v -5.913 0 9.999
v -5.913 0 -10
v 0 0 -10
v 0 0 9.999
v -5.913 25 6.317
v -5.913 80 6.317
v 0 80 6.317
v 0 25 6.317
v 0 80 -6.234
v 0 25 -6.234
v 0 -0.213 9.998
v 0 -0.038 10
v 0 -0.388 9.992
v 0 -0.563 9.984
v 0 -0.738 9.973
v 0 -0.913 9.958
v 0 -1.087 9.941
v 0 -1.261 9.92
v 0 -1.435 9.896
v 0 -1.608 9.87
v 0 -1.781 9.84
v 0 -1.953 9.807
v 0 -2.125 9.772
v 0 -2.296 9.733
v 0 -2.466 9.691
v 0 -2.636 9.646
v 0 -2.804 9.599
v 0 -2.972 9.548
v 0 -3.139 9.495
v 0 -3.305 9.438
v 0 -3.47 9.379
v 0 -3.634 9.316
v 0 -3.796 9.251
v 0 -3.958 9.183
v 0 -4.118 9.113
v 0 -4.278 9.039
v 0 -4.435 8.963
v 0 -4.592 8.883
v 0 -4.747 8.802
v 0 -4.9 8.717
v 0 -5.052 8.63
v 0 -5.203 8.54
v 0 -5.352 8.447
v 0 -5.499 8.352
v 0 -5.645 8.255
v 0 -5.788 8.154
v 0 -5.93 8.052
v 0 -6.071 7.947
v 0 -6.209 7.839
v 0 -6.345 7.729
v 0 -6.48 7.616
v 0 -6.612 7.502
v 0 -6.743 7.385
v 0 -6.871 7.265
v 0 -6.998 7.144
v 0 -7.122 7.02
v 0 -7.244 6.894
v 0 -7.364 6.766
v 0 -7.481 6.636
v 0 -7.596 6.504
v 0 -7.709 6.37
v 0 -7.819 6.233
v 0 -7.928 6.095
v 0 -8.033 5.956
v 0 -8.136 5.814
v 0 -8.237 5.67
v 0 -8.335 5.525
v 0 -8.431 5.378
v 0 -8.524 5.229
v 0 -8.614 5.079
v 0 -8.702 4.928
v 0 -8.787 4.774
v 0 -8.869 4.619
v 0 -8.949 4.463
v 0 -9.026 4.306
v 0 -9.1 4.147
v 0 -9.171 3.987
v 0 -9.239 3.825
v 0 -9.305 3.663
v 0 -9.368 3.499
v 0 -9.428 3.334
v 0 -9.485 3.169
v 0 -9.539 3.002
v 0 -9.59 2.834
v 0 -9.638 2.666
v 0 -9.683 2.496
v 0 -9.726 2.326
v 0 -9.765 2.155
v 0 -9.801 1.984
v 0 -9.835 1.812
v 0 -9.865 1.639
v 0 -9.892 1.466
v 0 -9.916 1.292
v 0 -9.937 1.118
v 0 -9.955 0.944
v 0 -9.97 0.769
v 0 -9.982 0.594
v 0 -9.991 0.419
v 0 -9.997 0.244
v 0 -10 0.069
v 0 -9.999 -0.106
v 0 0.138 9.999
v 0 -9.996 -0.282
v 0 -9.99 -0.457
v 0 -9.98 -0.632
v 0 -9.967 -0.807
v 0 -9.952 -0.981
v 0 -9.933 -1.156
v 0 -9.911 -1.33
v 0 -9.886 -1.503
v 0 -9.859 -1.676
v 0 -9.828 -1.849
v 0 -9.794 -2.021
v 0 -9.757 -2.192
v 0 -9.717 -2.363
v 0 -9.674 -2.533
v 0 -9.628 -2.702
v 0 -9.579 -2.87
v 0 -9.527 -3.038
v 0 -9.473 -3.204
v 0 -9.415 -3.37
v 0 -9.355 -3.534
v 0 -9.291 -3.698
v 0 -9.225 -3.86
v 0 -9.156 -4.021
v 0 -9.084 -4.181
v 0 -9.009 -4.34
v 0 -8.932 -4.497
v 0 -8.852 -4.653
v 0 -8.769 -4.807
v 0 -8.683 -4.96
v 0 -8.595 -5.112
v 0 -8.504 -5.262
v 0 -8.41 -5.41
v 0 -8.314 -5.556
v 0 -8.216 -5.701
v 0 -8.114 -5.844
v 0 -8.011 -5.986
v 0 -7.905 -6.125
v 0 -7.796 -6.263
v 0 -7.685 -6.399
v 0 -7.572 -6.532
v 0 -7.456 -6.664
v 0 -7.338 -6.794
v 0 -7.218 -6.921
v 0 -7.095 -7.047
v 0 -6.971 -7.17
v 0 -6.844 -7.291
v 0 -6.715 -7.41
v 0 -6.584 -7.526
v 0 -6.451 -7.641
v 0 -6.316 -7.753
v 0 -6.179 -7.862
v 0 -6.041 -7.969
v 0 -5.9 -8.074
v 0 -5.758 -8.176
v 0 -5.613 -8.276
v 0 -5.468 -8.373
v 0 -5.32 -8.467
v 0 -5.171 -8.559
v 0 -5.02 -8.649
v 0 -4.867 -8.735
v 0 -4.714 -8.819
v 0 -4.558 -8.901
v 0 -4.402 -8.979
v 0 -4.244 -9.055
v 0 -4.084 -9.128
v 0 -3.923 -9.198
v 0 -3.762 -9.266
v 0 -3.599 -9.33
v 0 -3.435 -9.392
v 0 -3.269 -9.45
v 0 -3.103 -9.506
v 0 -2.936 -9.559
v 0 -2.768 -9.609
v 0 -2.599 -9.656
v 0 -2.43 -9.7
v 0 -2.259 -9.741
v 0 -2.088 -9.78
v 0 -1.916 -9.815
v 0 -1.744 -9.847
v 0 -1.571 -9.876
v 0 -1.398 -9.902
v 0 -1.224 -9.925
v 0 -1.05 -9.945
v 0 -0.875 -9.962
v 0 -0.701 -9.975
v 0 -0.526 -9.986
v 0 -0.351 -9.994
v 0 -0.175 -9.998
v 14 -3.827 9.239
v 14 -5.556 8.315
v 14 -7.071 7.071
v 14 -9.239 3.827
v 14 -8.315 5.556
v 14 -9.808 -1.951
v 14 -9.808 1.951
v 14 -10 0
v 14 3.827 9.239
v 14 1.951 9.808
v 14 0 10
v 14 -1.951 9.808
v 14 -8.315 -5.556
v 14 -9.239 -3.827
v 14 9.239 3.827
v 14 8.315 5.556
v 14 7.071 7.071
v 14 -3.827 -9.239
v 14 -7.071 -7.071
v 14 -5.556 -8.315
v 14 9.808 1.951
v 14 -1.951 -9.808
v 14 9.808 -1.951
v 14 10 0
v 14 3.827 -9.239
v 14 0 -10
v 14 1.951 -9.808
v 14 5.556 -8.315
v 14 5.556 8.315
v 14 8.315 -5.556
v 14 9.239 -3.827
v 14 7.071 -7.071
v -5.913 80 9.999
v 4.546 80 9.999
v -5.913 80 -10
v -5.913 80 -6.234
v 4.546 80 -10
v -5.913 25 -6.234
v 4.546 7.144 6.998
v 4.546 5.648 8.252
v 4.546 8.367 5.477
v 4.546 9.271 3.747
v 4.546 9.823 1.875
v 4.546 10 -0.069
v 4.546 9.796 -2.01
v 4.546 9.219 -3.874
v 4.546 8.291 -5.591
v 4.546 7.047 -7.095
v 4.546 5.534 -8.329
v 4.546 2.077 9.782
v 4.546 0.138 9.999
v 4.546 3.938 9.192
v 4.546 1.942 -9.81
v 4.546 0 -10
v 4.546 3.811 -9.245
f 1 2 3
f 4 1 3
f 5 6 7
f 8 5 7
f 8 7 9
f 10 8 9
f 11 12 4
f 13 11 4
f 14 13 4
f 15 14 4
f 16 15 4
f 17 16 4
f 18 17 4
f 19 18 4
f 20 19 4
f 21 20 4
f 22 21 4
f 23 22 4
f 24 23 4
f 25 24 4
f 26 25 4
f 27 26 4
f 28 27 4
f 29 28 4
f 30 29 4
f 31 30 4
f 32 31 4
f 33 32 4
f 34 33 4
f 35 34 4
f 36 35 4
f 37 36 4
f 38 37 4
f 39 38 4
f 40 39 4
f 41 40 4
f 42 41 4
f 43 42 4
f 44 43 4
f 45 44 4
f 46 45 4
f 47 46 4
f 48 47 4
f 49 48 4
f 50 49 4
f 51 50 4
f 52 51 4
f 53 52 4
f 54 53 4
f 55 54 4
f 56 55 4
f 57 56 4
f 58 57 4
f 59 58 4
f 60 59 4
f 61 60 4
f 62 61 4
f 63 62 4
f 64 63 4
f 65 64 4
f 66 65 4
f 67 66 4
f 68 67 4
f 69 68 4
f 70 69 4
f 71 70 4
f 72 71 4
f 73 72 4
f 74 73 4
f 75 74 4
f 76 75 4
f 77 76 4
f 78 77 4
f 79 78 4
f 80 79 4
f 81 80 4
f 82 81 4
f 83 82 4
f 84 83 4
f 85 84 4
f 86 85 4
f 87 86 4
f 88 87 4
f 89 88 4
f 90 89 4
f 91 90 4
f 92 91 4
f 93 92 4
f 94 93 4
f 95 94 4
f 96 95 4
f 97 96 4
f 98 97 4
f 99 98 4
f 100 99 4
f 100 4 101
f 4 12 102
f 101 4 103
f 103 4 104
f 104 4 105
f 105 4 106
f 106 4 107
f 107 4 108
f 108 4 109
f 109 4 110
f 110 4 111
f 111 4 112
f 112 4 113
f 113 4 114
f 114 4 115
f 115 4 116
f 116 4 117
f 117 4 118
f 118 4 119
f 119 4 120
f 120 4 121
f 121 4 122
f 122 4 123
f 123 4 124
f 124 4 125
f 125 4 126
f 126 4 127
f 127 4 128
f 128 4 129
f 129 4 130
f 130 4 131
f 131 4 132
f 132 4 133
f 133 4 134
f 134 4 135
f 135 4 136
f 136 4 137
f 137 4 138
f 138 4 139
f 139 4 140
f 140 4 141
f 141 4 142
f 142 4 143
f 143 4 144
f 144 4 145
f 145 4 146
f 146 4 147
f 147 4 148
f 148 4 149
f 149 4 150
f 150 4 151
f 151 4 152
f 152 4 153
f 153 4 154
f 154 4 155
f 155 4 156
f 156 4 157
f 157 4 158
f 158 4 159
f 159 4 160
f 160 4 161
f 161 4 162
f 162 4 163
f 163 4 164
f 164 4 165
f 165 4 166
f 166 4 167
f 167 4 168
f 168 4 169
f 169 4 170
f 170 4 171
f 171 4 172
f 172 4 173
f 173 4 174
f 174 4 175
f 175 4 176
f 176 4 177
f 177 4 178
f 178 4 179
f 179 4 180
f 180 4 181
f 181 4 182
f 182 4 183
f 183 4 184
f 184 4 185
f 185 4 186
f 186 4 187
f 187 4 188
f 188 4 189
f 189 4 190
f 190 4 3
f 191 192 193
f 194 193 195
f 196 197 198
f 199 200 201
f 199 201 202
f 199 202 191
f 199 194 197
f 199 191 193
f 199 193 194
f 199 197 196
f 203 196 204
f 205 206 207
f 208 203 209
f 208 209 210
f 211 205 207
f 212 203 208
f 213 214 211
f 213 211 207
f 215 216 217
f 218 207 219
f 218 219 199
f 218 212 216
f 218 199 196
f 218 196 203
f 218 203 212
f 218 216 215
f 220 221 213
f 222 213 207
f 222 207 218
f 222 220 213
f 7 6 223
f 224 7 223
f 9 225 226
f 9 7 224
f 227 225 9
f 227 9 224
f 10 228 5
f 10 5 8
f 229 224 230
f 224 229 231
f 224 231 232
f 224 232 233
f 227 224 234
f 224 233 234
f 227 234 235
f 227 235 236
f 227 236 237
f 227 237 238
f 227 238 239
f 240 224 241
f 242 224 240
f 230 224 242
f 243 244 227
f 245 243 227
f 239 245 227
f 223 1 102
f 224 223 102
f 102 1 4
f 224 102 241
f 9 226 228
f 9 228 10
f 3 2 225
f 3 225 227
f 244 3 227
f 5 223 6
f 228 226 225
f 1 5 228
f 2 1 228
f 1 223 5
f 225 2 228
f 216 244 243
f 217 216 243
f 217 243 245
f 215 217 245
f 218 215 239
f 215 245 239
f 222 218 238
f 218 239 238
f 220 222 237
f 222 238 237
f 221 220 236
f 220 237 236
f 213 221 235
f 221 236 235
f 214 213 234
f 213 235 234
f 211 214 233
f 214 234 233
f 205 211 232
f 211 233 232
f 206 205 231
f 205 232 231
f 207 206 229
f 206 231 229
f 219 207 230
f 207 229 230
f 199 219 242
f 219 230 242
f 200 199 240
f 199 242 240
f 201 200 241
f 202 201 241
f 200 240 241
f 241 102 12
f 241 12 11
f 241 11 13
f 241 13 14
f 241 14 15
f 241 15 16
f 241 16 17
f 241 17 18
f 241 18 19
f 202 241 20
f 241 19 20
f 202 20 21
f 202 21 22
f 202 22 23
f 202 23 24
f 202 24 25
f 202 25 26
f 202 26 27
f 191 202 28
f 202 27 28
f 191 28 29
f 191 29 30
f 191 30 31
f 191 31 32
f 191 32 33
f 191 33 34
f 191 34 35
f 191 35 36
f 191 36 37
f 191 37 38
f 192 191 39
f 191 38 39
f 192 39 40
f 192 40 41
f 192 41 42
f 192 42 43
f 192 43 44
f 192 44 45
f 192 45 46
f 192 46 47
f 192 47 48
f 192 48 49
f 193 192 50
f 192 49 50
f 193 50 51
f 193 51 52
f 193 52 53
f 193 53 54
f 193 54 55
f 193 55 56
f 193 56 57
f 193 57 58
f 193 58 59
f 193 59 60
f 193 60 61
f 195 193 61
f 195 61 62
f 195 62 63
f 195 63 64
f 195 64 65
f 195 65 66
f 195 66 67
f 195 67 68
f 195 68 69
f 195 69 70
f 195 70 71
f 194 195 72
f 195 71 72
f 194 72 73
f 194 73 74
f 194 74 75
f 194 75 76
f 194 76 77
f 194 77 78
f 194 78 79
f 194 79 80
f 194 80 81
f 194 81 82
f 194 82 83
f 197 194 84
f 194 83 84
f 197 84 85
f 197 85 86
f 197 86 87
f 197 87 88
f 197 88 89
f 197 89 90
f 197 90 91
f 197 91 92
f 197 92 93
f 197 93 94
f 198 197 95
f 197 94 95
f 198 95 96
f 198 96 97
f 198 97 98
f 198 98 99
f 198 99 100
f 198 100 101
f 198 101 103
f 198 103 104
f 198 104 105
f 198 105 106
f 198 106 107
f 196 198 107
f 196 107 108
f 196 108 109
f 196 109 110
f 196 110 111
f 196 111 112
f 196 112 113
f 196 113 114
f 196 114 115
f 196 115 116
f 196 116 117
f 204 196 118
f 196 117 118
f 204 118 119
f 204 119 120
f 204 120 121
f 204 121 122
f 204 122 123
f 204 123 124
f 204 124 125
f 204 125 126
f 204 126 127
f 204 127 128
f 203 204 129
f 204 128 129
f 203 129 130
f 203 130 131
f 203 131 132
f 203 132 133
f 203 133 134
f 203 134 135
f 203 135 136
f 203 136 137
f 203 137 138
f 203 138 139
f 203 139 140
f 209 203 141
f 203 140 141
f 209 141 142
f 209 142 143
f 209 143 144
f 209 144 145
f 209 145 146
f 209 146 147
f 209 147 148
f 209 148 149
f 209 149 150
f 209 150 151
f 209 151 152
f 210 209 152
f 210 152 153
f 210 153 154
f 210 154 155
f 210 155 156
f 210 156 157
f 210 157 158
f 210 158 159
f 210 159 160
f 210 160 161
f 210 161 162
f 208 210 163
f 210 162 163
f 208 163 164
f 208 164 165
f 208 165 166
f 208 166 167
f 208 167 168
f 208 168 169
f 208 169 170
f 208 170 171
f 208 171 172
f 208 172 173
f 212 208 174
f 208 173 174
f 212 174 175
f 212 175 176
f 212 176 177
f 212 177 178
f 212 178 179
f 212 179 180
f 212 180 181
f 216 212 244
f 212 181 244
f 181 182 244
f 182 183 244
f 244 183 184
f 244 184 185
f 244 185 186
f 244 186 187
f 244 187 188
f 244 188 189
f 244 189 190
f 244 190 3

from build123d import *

# Parameters (mm, degrees)
SKETCH1_R           = 10
BOSS_EXTRUDE7_DEPTH = 14
SKETCH7_W           = 10.45925955
SKETCH7_H           = 19.99905213
BOSS_EXTRUDE9_DEPTH = 80
SKETCH8_W           = 5.913333595
SKETCH8_H           = 12.55111146
CUT_EXTRUDE3_DEPTH  = 55


with BuildPart() as part:
    # Sketch1 → Boss-Extrude7 (new body)
    with BuildSketch(Plane(origin=(0, 0, 0), x_dir=(0, 0, -1), z_dir=(1, 0, 0))):
        Circle(SKETCH1_R)
    extrude(amount=BOSS_EXTRUDE7_DEPTH)

    # Sketch7 → Boss-Extrude9 (add)
    with BuildSketch(Plane(origin=(0, 0, 0), x_dir=(1, 0, 0), z_dir=(0, 1, 0))):
        with Locations((-0.68370382, 0.000473935)):
            Rectangle(SKETCH7_W, SKETCH7_H)
    extrude(amount=BOSS_EXTRUDE9_DEPTH)

    # Sketch8 → Cut-Extrude3 (cut)
    with BuildSketch(Plane(origin=(0, 80, 0), x_dir=(1, 0, 0), z_dir=(0, 1, 0))):
        with Locations((-2.956666798, -0.041837038)):
            Rectangle(SKETCH8_W, SKETCH8_H)
    extrude(amount=-CUT_EXTRUDE3_DEPTH, mode=Mode.SUBTRACT)


solid = part.part
